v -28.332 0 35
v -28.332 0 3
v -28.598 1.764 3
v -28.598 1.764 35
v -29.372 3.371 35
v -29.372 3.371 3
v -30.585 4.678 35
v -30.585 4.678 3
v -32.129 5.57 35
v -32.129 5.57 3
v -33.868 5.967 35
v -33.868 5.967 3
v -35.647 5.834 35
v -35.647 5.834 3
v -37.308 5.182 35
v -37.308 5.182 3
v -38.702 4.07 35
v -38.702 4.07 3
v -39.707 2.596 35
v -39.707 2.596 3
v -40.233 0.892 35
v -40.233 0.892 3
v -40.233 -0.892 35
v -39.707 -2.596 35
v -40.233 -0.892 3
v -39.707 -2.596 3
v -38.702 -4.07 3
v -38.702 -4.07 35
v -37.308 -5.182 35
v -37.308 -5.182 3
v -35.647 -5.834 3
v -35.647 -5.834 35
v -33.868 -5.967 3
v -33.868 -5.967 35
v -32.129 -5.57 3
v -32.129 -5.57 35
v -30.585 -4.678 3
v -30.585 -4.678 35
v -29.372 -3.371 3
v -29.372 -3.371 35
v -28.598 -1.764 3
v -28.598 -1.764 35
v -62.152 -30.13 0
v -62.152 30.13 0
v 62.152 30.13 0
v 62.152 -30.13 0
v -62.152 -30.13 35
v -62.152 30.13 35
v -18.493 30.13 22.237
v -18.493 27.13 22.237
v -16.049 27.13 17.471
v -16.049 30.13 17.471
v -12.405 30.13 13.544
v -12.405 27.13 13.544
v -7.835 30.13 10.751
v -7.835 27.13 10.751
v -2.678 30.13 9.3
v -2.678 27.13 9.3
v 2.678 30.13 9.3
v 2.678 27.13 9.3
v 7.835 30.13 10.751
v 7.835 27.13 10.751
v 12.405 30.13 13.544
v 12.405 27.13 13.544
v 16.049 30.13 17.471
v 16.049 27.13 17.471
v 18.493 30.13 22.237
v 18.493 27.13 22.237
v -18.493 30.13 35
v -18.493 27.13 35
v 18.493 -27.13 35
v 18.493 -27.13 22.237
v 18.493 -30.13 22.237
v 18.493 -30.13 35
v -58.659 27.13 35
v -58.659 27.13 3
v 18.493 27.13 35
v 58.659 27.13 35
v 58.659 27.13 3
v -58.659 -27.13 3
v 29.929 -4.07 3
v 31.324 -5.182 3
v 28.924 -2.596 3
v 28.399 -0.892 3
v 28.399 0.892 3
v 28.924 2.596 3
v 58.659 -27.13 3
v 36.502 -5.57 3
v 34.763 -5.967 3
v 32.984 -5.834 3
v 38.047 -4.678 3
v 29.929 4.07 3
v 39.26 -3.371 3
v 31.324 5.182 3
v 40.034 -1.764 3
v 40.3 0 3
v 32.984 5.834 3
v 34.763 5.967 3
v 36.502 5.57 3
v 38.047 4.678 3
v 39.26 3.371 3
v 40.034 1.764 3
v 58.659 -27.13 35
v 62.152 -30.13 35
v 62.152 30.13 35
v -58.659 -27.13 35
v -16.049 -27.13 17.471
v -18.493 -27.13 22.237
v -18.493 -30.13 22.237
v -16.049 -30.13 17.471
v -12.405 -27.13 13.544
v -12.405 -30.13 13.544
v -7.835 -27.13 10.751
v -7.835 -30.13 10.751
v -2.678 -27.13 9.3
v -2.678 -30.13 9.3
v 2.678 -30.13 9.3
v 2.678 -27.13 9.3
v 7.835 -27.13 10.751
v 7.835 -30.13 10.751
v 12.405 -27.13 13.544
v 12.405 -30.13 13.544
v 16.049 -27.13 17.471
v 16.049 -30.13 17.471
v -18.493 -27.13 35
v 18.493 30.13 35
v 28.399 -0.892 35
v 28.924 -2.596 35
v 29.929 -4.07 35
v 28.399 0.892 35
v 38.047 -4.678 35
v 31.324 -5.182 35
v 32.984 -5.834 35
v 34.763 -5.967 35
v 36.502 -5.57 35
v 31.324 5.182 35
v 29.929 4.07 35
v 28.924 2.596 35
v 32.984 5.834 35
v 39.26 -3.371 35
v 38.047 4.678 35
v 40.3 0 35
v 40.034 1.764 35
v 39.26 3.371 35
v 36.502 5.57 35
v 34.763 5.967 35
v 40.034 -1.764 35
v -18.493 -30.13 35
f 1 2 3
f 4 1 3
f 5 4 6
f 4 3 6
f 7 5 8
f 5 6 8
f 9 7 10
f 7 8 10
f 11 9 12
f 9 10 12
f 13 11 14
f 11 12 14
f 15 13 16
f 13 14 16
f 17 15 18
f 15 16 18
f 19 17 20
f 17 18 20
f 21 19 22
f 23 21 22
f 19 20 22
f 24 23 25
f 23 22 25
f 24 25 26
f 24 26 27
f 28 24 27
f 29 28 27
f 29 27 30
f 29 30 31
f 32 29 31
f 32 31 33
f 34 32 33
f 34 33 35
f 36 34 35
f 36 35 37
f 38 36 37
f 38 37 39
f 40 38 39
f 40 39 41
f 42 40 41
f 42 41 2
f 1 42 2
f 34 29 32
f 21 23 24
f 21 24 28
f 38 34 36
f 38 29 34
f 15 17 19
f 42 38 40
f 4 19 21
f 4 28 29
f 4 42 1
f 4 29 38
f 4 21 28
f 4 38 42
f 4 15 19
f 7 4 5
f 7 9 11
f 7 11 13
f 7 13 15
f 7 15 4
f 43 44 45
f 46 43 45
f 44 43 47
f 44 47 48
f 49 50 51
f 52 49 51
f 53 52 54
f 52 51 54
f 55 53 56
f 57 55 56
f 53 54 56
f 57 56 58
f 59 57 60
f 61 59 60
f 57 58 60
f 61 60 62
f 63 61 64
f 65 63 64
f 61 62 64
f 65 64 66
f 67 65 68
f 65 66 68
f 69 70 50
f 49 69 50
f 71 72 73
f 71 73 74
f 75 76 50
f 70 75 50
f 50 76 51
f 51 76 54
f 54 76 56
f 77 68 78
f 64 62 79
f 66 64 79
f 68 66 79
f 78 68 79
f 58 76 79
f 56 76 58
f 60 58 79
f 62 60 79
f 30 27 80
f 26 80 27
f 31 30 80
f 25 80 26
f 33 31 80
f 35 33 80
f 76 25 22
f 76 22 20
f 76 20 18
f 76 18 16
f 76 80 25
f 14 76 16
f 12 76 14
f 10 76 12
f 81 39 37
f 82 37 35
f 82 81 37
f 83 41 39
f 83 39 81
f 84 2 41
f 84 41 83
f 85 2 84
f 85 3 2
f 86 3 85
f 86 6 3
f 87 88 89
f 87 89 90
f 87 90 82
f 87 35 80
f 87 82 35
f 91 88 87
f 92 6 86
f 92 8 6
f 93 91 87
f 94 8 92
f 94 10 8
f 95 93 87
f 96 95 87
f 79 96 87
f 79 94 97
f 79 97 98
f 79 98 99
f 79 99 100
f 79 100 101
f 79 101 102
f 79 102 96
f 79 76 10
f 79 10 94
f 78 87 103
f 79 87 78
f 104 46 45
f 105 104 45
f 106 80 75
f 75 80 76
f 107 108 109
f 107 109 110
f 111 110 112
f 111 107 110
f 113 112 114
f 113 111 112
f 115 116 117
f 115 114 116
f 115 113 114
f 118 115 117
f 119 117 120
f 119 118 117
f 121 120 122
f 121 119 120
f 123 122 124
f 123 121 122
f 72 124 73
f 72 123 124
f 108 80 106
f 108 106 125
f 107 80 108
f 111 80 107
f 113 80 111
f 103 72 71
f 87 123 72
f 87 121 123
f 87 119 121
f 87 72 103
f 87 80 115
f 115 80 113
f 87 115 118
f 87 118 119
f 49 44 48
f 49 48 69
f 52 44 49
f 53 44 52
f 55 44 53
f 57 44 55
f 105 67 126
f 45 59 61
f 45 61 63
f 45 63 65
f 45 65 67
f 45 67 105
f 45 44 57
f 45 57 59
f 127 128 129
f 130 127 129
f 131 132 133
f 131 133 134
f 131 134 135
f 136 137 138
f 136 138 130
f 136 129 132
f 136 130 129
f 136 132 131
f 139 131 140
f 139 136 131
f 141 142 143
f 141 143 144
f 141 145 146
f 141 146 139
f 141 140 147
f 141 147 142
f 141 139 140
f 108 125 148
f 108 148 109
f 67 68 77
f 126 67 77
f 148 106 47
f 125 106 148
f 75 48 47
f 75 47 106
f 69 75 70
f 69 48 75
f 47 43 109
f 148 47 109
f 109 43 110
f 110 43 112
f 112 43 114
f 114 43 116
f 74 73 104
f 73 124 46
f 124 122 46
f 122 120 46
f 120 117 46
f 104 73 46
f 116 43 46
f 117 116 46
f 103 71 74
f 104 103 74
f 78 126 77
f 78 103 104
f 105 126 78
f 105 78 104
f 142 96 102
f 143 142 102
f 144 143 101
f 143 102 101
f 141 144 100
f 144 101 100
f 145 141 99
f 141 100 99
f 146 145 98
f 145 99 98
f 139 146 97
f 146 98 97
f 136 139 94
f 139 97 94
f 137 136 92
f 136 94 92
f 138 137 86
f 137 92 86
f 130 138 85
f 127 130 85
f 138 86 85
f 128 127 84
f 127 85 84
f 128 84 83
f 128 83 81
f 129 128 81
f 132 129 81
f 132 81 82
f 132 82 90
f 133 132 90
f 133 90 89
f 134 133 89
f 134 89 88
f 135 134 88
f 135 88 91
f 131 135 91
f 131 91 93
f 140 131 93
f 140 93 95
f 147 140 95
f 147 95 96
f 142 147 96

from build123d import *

# Parameters (mm, degrees)
F0_W          = 117.318443954
F0_H          = 54.2597807944
F1_DEPTH      = 3
F2_W          = 124.3039702
F2_H          = 60.2597807944
F2_W_2        = 117.318443954
F2_H_2        = 54.2597807944
F3_DEPTH      = 35
F4_R          = 5.9838878744
F5_DEPTH      = 35
F7_DEPTH      = 30.1308903972
F7_DEPTH_BACK = 30.1308903972


with BuildPart() as f1:
    # F0 (on Top) → F1 (new body)
    with BuildSketch(Plane.XY):
        Rectangle(F0_W, F0_H)
    extrude(amount=F1_DEPTH)

    # F2 (on Top) → F3 (join)
    with BuildSketch(Plane.XY):
        Rectangle(F2_W, F2_H)
        Rectangle(F2_W_2, F2_H_2, mode=Mode.SUBTRACT)
    extrude(amount=F3_DEPTH)

    # F4 (on Top) → F5 (join)
    with BuildSketch(Plane.XY):
        with Locations((-34.3156456947, 0)):
            Circle(F4_R)
        with Locations((34.3156456947, 0)):
            Circle(F4_R)
    extrude(amount=F5_DEPTH)

    # F6 (on Front) → F7 (cut, two sides)
    with BuildSketch(Plane.XZ) as f7_sk:
        with BuildLine():
            Line((18.4925086796, 35), (-18.4925086796, 35))
            Line((-18.4925086796, 35), (-18.4925086796, 22.2374610603))
            ThreePointArc((-18.4925086796, 22.2374610603), (0, 9.1160805646), (18.4925086796, 22.2374610603))
            Line((18.4925086796, 22.2374610603), (18.4925086796, 35))
        make_face()
    extrude(amount=-F7_DEPTH, mode=Mode.SUBTRACT)
    extrude(f7_sk.sketch, amount=F7_DEPTH_BACK, mode=Mode.SUBTRACT)


solid = f1.part
